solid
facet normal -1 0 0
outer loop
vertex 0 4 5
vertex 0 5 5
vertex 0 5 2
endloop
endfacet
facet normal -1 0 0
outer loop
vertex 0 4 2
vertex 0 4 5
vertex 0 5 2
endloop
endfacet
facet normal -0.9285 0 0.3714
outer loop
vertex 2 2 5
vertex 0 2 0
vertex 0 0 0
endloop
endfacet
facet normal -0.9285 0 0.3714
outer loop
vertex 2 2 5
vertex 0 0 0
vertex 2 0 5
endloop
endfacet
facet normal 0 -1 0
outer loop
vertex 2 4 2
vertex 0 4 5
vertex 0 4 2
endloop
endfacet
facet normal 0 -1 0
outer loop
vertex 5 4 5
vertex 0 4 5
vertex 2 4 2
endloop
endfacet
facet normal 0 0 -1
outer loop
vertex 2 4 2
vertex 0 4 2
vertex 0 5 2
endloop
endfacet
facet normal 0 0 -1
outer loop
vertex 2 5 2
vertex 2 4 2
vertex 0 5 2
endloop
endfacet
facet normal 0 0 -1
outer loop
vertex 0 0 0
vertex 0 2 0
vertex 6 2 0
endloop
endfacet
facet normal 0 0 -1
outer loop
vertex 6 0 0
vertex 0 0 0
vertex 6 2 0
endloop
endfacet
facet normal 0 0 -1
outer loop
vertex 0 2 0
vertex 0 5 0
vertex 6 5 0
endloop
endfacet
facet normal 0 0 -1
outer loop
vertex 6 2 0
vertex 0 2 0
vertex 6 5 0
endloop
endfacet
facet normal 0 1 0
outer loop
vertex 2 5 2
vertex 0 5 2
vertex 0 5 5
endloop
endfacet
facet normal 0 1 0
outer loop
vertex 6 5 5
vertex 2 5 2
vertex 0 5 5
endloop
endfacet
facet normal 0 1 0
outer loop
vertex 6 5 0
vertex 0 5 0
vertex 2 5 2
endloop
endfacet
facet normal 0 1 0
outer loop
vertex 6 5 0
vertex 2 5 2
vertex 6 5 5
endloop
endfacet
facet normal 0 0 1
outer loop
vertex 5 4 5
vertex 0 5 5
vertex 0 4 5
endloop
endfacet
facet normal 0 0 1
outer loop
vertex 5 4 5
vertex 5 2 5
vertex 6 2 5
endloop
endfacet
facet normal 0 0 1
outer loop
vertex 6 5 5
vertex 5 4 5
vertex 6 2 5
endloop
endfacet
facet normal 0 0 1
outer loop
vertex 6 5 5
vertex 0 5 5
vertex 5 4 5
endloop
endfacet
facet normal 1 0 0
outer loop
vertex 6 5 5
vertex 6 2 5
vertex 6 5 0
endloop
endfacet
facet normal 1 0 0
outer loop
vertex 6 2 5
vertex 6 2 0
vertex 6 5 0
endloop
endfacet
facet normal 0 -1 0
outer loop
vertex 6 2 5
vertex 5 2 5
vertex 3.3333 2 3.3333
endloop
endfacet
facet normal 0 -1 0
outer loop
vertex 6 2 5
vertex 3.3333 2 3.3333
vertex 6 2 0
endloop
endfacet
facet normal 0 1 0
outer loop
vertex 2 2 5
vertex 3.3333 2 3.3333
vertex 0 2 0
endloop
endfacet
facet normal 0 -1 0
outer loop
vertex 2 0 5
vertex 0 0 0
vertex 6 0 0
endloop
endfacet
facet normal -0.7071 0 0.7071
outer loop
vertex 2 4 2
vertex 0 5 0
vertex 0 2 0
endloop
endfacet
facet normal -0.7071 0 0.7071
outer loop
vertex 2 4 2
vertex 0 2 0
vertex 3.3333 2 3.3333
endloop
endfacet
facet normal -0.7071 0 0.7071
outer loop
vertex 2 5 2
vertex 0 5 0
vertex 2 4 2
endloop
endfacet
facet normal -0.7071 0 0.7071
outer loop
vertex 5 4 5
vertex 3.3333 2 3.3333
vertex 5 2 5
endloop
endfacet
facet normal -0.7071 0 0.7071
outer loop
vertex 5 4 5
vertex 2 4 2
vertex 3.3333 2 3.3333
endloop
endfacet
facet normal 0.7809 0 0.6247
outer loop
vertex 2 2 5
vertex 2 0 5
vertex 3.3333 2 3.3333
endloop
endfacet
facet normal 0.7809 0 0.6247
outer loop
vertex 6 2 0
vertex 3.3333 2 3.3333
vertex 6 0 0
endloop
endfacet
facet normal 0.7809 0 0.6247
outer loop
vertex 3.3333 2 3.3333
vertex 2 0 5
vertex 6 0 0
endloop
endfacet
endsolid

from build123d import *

# Parameters (mm, degrees)
SKETCH3_W           = 6
SKETCH3_H           = 5
BOSS_EXTRUDE1_DEPTH = 5
CUT_EXTRUDE1_DEPTH  = 3
CUT_EXTRUDE2_DEPTH  = 3
SKETCH6_W           = 3
SKETCH6_H           = 1
BOSS_EXTRUDE2_DEPTH = 6
CUT_EXTRUDE3_DEPTH  = 2


with BuildPart() as part:
    # Sketch3 → Boss-Extrude1 (new body)
    with BuildSketch(Plane.XY):
        with Locations((3, 2.5)):
            Rectangle(SKETCH3_W, SKETCH3_H)
    extrude(amount=BOSS_EXTRUDE1_DEPTH)

    # Sketch4 → Cut-Extrude1 (cut)
    with BuildSketch(Plane(origin=(0, 5, 0), x_dir=(1, 0, 0), z_dir=(0, 1, 0))):
        Polygon((0, 0), (5, -5), (0, -5), align=None)
    extrude(amount=-CUT_EXTRUDE1_DEPTH, mode=Mode.SUBTRACT)

    # Sketch5 → Cut-Extrude2 (cut)
    with BuildSketch(Plane(origin=(0, 2, 0), x_dir=(1, 0, 0), z_dir=(0, 1, 0))):
        Polygon((0, 0), (2, -5), (0, -5), align=None)
    extrude(amount=-CUT_EXTRUDE2_DEPTH, mode=Mode.SUBTRACT)

    # Sketch6 → Boss-Extrude2 (add)
    with BuildSketch(Plane(origin=(6, 0, 0), x_dir=(0, 0, -1), z_dir=(1, 0, 0))):
        with Locations((-3.5, 4.5)):
            Rectangle(SKETCH6_W, SKETCH6_H)
    extrude(amount=-BOSS_EXTRUDE2_DEPTH)

    # Sketch7 → Cut-Extrude3 (cut)
    with BuildSketch(Plane.XZ):
        Polygon((2, 5), (6, 0), (6, 5), align=None)
    extrude(amount=-CUT_EXTRUDE3_DEPTH, mode=Mode.SUBTRACT)


solid = part.part
